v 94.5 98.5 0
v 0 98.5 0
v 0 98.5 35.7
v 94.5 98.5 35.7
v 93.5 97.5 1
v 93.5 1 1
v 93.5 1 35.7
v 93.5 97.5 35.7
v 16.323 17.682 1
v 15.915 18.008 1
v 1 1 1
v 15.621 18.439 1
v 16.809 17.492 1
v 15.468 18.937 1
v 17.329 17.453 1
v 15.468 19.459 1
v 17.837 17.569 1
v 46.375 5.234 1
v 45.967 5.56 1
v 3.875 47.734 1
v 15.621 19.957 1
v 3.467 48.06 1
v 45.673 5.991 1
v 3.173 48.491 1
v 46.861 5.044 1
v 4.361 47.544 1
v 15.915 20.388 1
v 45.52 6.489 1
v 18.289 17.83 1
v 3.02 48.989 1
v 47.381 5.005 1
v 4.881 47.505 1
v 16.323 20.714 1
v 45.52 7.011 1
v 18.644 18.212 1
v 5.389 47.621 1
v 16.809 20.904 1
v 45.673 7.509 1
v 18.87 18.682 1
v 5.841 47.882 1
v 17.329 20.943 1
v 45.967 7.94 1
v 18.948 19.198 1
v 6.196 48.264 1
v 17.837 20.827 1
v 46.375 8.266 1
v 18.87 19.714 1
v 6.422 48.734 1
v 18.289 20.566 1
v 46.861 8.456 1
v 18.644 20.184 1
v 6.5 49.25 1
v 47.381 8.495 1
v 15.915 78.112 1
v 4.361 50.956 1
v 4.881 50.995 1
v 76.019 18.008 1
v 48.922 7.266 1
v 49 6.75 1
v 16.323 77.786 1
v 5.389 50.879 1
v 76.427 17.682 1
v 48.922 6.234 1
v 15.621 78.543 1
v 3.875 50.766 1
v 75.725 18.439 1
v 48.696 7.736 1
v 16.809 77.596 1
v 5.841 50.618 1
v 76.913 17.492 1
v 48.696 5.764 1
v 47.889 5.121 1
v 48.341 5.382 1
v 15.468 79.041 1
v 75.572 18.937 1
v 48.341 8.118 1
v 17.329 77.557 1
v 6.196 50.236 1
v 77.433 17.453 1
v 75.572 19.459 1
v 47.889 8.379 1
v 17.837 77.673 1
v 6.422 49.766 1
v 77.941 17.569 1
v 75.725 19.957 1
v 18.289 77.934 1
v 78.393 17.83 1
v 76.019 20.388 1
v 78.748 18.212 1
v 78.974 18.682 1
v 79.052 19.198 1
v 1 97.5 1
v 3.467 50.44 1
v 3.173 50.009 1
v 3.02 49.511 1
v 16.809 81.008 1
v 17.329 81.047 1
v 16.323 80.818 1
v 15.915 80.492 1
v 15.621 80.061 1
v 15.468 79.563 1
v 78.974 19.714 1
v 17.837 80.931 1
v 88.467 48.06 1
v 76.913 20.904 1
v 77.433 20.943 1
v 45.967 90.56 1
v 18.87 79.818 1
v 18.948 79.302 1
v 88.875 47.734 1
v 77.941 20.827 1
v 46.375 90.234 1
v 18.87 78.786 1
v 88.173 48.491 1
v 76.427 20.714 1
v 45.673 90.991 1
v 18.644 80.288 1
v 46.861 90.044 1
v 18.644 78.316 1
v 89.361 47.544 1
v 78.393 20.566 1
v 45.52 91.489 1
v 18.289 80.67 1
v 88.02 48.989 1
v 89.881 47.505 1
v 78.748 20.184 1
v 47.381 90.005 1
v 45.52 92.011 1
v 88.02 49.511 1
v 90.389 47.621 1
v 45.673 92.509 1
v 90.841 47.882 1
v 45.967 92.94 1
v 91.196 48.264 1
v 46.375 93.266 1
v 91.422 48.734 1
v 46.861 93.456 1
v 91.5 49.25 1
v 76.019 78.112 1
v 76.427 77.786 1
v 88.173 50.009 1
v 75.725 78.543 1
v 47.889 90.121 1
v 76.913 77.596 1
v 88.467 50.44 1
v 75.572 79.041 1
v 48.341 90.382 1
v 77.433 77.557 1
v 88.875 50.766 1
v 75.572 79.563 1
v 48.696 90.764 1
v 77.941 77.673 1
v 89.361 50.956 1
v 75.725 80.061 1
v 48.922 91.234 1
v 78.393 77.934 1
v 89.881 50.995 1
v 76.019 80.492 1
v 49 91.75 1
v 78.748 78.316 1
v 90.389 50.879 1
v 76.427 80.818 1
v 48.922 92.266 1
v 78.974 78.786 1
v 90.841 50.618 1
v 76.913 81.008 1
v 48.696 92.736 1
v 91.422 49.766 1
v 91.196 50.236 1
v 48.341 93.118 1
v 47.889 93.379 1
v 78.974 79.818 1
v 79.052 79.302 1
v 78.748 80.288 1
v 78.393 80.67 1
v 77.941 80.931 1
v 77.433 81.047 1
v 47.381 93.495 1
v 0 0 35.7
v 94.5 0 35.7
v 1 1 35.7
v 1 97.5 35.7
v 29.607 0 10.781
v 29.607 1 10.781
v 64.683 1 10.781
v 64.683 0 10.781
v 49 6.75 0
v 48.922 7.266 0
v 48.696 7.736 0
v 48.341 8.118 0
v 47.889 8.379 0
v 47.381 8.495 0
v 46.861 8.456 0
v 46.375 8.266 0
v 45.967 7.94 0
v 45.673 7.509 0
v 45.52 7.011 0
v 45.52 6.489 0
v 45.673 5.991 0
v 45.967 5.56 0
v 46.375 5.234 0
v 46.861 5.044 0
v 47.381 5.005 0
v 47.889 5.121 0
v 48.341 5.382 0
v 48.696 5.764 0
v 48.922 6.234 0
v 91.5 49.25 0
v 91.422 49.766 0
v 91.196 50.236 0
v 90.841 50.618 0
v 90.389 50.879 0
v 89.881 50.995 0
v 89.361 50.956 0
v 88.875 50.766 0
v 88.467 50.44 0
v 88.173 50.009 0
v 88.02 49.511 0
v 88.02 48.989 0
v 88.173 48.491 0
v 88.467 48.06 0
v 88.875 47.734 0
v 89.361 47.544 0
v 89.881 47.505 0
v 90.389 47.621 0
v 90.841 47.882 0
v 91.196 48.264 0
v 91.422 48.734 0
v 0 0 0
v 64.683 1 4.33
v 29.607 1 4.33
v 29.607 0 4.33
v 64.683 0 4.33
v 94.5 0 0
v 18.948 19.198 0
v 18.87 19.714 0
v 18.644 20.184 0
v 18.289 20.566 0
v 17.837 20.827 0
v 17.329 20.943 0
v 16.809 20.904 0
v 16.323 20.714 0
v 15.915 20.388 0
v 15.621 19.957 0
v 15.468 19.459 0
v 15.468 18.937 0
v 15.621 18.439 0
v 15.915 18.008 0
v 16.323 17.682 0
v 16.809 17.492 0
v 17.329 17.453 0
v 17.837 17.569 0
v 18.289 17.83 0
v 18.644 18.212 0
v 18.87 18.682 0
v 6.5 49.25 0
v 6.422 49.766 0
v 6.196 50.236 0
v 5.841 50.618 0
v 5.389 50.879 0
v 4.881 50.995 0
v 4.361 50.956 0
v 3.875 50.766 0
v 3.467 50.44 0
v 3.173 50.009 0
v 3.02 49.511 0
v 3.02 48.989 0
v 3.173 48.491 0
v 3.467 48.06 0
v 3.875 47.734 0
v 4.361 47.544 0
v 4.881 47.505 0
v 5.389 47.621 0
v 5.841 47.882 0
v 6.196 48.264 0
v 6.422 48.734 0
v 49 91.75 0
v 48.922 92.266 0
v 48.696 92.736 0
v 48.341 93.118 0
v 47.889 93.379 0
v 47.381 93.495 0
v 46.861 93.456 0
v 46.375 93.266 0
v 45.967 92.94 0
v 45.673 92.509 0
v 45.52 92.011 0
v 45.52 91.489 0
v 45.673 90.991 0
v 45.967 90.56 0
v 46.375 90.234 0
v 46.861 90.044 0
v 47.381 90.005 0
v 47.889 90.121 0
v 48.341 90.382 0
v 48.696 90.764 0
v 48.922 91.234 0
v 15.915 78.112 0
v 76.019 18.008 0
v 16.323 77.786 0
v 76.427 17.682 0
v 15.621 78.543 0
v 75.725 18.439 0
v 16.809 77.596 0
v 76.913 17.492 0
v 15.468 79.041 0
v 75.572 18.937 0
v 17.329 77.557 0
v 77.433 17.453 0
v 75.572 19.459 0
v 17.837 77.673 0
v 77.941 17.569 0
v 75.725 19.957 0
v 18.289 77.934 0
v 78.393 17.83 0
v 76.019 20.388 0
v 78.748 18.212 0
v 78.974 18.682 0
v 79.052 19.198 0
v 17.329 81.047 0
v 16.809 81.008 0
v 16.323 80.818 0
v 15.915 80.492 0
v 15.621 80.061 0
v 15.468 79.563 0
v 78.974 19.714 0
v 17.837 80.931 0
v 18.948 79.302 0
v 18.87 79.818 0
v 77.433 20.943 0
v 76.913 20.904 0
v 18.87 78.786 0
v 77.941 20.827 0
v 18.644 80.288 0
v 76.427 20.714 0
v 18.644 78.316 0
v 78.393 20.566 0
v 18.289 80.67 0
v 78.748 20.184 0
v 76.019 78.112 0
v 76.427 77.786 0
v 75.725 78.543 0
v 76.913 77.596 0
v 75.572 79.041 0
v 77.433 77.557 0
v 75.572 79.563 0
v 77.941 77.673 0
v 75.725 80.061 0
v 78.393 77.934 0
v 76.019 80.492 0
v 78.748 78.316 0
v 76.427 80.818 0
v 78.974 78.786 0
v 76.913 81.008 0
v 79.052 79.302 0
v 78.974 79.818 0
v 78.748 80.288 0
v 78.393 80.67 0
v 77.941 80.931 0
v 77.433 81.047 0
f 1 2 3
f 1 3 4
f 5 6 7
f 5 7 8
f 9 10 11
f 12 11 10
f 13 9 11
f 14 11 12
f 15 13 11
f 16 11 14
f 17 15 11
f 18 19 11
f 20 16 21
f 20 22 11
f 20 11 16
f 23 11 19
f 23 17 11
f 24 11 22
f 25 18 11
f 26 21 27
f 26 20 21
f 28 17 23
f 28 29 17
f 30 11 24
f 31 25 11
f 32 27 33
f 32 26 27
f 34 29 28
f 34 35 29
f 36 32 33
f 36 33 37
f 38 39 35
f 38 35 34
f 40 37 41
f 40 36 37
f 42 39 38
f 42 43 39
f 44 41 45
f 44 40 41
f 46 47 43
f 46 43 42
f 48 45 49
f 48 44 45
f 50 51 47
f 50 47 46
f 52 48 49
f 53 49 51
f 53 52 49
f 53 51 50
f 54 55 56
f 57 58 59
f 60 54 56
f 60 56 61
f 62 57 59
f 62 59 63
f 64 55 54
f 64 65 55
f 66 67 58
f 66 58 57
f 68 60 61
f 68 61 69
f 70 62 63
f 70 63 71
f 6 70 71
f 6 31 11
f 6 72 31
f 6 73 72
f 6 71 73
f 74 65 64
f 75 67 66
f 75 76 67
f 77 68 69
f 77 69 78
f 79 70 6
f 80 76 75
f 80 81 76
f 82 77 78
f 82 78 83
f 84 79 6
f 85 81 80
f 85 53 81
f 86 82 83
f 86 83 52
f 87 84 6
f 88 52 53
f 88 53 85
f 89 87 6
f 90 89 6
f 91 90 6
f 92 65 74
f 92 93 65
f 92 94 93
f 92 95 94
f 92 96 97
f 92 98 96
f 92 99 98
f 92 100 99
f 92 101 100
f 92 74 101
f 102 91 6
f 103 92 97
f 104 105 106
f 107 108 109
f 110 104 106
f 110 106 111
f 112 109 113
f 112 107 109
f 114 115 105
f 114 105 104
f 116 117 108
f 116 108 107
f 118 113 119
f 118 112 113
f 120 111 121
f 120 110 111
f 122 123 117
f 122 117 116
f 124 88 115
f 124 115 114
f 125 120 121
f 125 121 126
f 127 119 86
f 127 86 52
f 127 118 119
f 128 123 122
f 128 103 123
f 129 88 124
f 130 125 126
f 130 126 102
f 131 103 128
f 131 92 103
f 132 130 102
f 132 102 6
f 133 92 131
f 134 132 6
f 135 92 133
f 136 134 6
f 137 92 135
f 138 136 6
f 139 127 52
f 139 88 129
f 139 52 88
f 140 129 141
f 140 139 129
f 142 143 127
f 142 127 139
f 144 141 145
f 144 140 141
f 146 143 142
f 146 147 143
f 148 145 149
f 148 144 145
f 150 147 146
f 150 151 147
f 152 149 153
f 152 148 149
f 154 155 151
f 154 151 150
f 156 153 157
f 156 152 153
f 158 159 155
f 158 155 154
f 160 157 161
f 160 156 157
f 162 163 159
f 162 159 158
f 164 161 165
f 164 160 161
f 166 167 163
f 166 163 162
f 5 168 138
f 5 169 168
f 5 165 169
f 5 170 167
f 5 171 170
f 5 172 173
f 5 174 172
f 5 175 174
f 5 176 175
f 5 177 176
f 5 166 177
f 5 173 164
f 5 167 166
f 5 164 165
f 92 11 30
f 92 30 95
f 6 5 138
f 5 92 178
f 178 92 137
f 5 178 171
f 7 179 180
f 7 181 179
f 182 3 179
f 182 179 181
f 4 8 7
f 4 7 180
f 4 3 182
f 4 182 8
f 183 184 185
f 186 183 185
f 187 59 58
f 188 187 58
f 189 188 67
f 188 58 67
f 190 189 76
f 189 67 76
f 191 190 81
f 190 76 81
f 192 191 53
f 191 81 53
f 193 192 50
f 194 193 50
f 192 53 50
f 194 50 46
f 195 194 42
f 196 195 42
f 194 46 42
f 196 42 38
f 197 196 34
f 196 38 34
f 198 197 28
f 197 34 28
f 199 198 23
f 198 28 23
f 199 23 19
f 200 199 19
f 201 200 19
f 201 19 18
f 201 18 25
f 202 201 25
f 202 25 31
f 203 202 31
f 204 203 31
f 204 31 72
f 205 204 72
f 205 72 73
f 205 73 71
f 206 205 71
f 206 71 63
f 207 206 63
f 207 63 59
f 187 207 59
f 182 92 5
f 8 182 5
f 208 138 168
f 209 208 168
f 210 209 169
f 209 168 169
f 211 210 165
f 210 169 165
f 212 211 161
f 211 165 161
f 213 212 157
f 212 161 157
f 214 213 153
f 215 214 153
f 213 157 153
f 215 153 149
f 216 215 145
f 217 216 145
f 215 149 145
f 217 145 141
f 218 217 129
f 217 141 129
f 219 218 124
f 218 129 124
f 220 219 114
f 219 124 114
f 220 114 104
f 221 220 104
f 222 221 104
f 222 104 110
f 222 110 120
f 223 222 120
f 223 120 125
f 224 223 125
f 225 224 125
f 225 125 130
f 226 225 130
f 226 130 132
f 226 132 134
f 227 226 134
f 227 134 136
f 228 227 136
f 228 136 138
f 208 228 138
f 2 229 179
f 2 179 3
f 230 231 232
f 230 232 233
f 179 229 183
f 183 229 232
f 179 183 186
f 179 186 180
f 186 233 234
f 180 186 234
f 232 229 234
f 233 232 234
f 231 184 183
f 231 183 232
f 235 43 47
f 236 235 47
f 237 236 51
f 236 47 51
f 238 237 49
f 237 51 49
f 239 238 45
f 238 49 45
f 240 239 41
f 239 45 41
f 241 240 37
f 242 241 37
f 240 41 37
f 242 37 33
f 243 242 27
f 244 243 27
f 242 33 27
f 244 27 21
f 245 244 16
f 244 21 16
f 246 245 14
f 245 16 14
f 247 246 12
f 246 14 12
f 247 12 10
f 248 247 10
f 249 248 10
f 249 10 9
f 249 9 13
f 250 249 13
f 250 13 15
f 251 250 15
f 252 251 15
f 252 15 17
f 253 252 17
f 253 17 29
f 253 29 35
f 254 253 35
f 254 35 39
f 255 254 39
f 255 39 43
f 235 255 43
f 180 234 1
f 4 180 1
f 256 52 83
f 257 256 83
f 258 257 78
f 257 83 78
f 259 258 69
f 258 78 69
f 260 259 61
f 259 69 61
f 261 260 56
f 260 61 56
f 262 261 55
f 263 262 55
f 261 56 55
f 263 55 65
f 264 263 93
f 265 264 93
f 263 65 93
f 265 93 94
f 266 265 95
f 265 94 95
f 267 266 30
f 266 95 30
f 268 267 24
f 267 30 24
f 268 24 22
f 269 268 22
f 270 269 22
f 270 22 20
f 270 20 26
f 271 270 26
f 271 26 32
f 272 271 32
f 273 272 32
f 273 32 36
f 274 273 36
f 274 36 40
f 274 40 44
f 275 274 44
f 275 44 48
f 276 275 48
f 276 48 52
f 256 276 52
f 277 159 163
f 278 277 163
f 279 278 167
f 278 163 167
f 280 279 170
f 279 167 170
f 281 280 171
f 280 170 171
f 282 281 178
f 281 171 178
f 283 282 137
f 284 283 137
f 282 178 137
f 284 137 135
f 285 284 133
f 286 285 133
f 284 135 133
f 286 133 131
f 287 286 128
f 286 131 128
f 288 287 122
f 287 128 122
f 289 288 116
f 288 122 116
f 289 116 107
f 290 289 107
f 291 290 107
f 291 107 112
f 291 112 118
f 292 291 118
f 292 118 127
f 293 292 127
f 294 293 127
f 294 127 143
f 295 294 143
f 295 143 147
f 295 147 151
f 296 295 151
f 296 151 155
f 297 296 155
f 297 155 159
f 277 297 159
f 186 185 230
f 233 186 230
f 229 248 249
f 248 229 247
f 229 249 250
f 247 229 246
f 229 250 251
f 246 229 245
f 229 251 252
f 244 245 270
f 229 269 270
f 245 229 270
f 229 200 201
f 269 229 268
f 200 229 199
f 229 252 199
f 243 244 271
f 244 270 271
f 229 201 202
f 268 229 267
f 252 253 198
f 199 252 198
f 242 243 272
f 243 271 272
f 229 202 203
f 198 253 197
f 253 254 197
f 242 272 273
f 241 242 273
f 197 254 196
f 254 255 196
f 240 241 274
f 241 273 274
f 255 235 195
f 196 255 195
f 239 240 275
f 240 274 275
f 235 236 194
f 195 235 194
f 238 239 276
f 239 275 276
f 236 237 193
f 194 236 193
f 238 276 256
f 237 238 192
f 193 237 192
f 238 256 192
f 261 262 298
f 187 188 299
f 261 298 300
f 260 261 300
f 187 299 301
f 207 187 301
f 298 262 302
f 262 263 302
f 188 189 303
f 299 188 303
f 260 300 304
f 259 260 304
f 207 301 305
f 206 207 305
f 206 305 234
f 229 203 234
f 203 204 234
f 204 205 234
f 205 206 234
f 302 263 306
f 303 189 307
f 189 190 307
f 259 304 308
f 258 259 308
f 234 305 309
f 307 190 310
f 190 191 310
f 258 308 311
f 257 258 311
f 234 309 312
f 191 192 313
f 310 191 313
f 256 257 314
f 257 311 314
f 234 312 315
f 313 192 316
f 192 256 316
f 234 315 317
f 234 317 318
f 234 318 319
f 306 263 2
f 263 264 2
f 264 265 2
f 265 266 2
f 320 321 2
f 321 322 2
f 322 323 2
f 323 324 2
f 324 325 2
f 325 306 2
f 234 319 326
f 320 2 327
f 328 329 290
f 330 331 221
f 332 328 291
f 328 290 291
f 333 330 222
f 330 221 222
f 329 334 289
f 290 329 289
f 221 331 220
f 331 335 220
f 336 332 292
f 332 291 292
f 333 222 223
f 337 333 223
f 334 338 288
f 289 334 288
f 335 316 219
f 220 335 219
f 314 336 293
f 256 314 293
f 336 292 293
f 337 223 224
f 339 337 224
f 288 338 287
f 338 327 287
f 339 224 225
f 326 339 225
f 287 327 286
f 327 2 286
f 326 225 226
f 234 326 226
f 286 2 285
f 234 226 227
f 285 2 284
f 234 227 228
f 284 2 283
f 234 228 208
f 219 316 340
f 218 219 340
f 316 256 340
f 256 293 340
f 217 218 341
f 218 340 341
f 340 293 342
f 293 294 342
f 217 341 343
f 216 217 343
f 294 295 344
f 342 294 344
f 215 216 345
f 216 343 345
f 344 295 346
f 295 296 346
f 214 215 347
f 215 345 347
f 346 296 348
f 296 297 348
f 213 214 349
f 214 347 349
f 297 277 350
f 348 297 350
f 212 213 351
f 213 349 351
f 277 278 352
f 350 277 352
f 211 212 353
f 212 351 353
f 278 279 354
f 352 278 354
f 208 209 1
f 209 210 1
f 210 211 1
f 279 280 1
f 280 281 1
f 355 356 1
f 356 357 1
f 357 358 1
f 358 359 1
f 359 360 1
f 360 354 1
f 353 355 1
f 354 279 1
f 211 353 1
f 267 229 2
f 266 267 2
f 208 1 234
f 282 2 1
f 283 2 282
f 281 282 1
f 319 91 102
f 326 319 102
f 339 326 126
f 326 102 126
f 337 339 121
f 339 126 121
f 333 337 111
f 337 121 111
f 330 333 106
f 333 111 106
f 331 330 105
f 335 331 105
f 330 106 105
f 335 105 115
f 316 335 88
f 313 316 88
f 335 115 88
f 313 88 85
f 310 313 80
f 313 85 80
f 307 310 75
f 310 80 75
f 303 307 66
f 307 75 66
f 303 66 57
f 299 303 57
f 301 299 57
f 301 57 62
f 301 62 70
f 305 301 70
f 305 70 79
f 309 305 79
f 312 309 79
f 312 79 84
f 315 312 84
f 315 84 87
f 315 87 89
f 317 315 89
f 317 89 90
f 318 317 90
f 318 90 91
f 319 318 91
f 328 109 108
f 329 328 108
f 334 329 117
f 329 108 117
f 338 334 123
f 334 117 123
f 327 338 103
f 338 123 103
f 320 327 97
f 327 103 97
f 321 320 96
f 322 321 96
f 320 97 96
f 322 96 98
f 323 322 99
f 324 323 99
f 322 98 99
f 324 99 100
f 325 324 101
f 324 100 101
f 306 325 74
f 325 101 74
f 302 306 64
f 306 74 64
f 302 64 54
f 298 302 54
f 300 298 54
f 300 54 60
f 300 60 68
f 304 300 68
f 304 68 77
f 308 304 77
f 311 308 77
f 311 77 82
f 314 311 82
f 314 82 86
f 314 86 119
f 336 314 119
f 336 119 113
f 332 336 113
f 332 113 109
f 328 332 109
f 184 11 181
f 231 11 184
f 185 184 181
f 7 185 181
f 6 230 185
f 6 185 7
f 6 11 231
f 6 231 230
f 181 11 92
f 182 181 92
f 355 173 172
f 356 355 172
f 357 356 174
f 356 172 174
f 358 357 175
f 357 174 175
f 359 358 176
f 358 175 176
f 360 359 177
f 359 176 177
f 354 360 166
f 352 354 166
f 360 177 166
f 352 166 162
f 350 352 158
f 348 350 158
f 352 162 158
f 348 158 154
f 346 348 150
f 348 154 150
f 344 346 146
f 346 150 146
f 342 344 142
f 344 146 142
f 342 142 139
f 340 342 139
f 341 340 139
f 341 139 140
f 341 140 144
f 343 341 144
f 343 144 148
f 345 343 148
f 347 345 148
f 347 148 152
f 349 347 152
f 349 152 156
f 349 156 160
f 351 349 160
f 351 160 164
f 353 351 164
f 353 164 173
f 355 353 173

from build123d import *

# Parameters (mm, degrees)
SKETCH_2_W          = 94.5
SKETCH_2_H          = 98.5
EXTRUDE_1_DEPTH     = 35.7
SHELL_1_T           = -1
SKETCH_5_W          = 35.076830759
SKETCH_5_H          = 6.451639633
CUT_EXTRUDE_1_DEPTH = 2
SKETCH_3_R          = 1.75
CUT_EXTRUDE_2_DEPTH = 2


with BuildPart() as part:
    # 草图2 → 凸台-拉伸1 (new body)
    with BuildSketch(Plane.XY):
        with Locations((47.25, 49.25)):
            Rectangle(SKETCH_2_W, SKETCH_2_H)
    extrude(amount=EXTRUDE_1_DEPTH)

    # 抽壳1
    shell_1_openings = [part.faces().sort_by_distance(p)[0] for p in [
        (47.25, 49.25, 35.7),
    ]]
    offset(amount=SHELL_1_T, openings=shell_1_openings, kind=Kind.INTERSECTION)

    # 草图5 → 切除-拉伸1 (cut, through all)
    with BuildSketch(Plane(origin=(0, 1, 0), x_dir=(1, 0, 0), z_dir=(0, 1, 0))):
        with Locations((47.144981411, -7.555579656)):
            Rectangle(SKETCH_5_W, SKETCH_5_H)
    extrude(amount=-CUT_EXTRUDE_1_DEPTH, mode=Mode.SUBTRACT)

    # 草图3 → 切除-拉伸2 (cut, through all)
    with BuildSketch(Plane.XY.offset(1)):
        with Locations((4.75, 49.25)):
            Circle(SKETCH_3_R)
        with Locations((17.1979618, 19.1979618)):
            Circle(SKETCH_3_R)
        with Locations((47.25, 6.75)):
            Circle(SKETCH_3_R)
        with Locations((77.302038201, 19.1979618)):
            Circle(SKETCH_3_R)
        with Locations((89.75, 49.25)):
            Circle(SKETCH_3_R)
        with Locations((77.302038201, 79.3020382)):
            Circle(SKETCH_3_R)
        with Locations((47.25, 91.75)):
            Circle(SKETCH_3_R)
        with Locations((17.1979618, 79.3020382)):
            Circle(SKETCH_3_R)
    extrude(amount=-CUT_EXTRUDE_2_DEPTH, mode=Mode.SUBTRACT)


solid = part.part
